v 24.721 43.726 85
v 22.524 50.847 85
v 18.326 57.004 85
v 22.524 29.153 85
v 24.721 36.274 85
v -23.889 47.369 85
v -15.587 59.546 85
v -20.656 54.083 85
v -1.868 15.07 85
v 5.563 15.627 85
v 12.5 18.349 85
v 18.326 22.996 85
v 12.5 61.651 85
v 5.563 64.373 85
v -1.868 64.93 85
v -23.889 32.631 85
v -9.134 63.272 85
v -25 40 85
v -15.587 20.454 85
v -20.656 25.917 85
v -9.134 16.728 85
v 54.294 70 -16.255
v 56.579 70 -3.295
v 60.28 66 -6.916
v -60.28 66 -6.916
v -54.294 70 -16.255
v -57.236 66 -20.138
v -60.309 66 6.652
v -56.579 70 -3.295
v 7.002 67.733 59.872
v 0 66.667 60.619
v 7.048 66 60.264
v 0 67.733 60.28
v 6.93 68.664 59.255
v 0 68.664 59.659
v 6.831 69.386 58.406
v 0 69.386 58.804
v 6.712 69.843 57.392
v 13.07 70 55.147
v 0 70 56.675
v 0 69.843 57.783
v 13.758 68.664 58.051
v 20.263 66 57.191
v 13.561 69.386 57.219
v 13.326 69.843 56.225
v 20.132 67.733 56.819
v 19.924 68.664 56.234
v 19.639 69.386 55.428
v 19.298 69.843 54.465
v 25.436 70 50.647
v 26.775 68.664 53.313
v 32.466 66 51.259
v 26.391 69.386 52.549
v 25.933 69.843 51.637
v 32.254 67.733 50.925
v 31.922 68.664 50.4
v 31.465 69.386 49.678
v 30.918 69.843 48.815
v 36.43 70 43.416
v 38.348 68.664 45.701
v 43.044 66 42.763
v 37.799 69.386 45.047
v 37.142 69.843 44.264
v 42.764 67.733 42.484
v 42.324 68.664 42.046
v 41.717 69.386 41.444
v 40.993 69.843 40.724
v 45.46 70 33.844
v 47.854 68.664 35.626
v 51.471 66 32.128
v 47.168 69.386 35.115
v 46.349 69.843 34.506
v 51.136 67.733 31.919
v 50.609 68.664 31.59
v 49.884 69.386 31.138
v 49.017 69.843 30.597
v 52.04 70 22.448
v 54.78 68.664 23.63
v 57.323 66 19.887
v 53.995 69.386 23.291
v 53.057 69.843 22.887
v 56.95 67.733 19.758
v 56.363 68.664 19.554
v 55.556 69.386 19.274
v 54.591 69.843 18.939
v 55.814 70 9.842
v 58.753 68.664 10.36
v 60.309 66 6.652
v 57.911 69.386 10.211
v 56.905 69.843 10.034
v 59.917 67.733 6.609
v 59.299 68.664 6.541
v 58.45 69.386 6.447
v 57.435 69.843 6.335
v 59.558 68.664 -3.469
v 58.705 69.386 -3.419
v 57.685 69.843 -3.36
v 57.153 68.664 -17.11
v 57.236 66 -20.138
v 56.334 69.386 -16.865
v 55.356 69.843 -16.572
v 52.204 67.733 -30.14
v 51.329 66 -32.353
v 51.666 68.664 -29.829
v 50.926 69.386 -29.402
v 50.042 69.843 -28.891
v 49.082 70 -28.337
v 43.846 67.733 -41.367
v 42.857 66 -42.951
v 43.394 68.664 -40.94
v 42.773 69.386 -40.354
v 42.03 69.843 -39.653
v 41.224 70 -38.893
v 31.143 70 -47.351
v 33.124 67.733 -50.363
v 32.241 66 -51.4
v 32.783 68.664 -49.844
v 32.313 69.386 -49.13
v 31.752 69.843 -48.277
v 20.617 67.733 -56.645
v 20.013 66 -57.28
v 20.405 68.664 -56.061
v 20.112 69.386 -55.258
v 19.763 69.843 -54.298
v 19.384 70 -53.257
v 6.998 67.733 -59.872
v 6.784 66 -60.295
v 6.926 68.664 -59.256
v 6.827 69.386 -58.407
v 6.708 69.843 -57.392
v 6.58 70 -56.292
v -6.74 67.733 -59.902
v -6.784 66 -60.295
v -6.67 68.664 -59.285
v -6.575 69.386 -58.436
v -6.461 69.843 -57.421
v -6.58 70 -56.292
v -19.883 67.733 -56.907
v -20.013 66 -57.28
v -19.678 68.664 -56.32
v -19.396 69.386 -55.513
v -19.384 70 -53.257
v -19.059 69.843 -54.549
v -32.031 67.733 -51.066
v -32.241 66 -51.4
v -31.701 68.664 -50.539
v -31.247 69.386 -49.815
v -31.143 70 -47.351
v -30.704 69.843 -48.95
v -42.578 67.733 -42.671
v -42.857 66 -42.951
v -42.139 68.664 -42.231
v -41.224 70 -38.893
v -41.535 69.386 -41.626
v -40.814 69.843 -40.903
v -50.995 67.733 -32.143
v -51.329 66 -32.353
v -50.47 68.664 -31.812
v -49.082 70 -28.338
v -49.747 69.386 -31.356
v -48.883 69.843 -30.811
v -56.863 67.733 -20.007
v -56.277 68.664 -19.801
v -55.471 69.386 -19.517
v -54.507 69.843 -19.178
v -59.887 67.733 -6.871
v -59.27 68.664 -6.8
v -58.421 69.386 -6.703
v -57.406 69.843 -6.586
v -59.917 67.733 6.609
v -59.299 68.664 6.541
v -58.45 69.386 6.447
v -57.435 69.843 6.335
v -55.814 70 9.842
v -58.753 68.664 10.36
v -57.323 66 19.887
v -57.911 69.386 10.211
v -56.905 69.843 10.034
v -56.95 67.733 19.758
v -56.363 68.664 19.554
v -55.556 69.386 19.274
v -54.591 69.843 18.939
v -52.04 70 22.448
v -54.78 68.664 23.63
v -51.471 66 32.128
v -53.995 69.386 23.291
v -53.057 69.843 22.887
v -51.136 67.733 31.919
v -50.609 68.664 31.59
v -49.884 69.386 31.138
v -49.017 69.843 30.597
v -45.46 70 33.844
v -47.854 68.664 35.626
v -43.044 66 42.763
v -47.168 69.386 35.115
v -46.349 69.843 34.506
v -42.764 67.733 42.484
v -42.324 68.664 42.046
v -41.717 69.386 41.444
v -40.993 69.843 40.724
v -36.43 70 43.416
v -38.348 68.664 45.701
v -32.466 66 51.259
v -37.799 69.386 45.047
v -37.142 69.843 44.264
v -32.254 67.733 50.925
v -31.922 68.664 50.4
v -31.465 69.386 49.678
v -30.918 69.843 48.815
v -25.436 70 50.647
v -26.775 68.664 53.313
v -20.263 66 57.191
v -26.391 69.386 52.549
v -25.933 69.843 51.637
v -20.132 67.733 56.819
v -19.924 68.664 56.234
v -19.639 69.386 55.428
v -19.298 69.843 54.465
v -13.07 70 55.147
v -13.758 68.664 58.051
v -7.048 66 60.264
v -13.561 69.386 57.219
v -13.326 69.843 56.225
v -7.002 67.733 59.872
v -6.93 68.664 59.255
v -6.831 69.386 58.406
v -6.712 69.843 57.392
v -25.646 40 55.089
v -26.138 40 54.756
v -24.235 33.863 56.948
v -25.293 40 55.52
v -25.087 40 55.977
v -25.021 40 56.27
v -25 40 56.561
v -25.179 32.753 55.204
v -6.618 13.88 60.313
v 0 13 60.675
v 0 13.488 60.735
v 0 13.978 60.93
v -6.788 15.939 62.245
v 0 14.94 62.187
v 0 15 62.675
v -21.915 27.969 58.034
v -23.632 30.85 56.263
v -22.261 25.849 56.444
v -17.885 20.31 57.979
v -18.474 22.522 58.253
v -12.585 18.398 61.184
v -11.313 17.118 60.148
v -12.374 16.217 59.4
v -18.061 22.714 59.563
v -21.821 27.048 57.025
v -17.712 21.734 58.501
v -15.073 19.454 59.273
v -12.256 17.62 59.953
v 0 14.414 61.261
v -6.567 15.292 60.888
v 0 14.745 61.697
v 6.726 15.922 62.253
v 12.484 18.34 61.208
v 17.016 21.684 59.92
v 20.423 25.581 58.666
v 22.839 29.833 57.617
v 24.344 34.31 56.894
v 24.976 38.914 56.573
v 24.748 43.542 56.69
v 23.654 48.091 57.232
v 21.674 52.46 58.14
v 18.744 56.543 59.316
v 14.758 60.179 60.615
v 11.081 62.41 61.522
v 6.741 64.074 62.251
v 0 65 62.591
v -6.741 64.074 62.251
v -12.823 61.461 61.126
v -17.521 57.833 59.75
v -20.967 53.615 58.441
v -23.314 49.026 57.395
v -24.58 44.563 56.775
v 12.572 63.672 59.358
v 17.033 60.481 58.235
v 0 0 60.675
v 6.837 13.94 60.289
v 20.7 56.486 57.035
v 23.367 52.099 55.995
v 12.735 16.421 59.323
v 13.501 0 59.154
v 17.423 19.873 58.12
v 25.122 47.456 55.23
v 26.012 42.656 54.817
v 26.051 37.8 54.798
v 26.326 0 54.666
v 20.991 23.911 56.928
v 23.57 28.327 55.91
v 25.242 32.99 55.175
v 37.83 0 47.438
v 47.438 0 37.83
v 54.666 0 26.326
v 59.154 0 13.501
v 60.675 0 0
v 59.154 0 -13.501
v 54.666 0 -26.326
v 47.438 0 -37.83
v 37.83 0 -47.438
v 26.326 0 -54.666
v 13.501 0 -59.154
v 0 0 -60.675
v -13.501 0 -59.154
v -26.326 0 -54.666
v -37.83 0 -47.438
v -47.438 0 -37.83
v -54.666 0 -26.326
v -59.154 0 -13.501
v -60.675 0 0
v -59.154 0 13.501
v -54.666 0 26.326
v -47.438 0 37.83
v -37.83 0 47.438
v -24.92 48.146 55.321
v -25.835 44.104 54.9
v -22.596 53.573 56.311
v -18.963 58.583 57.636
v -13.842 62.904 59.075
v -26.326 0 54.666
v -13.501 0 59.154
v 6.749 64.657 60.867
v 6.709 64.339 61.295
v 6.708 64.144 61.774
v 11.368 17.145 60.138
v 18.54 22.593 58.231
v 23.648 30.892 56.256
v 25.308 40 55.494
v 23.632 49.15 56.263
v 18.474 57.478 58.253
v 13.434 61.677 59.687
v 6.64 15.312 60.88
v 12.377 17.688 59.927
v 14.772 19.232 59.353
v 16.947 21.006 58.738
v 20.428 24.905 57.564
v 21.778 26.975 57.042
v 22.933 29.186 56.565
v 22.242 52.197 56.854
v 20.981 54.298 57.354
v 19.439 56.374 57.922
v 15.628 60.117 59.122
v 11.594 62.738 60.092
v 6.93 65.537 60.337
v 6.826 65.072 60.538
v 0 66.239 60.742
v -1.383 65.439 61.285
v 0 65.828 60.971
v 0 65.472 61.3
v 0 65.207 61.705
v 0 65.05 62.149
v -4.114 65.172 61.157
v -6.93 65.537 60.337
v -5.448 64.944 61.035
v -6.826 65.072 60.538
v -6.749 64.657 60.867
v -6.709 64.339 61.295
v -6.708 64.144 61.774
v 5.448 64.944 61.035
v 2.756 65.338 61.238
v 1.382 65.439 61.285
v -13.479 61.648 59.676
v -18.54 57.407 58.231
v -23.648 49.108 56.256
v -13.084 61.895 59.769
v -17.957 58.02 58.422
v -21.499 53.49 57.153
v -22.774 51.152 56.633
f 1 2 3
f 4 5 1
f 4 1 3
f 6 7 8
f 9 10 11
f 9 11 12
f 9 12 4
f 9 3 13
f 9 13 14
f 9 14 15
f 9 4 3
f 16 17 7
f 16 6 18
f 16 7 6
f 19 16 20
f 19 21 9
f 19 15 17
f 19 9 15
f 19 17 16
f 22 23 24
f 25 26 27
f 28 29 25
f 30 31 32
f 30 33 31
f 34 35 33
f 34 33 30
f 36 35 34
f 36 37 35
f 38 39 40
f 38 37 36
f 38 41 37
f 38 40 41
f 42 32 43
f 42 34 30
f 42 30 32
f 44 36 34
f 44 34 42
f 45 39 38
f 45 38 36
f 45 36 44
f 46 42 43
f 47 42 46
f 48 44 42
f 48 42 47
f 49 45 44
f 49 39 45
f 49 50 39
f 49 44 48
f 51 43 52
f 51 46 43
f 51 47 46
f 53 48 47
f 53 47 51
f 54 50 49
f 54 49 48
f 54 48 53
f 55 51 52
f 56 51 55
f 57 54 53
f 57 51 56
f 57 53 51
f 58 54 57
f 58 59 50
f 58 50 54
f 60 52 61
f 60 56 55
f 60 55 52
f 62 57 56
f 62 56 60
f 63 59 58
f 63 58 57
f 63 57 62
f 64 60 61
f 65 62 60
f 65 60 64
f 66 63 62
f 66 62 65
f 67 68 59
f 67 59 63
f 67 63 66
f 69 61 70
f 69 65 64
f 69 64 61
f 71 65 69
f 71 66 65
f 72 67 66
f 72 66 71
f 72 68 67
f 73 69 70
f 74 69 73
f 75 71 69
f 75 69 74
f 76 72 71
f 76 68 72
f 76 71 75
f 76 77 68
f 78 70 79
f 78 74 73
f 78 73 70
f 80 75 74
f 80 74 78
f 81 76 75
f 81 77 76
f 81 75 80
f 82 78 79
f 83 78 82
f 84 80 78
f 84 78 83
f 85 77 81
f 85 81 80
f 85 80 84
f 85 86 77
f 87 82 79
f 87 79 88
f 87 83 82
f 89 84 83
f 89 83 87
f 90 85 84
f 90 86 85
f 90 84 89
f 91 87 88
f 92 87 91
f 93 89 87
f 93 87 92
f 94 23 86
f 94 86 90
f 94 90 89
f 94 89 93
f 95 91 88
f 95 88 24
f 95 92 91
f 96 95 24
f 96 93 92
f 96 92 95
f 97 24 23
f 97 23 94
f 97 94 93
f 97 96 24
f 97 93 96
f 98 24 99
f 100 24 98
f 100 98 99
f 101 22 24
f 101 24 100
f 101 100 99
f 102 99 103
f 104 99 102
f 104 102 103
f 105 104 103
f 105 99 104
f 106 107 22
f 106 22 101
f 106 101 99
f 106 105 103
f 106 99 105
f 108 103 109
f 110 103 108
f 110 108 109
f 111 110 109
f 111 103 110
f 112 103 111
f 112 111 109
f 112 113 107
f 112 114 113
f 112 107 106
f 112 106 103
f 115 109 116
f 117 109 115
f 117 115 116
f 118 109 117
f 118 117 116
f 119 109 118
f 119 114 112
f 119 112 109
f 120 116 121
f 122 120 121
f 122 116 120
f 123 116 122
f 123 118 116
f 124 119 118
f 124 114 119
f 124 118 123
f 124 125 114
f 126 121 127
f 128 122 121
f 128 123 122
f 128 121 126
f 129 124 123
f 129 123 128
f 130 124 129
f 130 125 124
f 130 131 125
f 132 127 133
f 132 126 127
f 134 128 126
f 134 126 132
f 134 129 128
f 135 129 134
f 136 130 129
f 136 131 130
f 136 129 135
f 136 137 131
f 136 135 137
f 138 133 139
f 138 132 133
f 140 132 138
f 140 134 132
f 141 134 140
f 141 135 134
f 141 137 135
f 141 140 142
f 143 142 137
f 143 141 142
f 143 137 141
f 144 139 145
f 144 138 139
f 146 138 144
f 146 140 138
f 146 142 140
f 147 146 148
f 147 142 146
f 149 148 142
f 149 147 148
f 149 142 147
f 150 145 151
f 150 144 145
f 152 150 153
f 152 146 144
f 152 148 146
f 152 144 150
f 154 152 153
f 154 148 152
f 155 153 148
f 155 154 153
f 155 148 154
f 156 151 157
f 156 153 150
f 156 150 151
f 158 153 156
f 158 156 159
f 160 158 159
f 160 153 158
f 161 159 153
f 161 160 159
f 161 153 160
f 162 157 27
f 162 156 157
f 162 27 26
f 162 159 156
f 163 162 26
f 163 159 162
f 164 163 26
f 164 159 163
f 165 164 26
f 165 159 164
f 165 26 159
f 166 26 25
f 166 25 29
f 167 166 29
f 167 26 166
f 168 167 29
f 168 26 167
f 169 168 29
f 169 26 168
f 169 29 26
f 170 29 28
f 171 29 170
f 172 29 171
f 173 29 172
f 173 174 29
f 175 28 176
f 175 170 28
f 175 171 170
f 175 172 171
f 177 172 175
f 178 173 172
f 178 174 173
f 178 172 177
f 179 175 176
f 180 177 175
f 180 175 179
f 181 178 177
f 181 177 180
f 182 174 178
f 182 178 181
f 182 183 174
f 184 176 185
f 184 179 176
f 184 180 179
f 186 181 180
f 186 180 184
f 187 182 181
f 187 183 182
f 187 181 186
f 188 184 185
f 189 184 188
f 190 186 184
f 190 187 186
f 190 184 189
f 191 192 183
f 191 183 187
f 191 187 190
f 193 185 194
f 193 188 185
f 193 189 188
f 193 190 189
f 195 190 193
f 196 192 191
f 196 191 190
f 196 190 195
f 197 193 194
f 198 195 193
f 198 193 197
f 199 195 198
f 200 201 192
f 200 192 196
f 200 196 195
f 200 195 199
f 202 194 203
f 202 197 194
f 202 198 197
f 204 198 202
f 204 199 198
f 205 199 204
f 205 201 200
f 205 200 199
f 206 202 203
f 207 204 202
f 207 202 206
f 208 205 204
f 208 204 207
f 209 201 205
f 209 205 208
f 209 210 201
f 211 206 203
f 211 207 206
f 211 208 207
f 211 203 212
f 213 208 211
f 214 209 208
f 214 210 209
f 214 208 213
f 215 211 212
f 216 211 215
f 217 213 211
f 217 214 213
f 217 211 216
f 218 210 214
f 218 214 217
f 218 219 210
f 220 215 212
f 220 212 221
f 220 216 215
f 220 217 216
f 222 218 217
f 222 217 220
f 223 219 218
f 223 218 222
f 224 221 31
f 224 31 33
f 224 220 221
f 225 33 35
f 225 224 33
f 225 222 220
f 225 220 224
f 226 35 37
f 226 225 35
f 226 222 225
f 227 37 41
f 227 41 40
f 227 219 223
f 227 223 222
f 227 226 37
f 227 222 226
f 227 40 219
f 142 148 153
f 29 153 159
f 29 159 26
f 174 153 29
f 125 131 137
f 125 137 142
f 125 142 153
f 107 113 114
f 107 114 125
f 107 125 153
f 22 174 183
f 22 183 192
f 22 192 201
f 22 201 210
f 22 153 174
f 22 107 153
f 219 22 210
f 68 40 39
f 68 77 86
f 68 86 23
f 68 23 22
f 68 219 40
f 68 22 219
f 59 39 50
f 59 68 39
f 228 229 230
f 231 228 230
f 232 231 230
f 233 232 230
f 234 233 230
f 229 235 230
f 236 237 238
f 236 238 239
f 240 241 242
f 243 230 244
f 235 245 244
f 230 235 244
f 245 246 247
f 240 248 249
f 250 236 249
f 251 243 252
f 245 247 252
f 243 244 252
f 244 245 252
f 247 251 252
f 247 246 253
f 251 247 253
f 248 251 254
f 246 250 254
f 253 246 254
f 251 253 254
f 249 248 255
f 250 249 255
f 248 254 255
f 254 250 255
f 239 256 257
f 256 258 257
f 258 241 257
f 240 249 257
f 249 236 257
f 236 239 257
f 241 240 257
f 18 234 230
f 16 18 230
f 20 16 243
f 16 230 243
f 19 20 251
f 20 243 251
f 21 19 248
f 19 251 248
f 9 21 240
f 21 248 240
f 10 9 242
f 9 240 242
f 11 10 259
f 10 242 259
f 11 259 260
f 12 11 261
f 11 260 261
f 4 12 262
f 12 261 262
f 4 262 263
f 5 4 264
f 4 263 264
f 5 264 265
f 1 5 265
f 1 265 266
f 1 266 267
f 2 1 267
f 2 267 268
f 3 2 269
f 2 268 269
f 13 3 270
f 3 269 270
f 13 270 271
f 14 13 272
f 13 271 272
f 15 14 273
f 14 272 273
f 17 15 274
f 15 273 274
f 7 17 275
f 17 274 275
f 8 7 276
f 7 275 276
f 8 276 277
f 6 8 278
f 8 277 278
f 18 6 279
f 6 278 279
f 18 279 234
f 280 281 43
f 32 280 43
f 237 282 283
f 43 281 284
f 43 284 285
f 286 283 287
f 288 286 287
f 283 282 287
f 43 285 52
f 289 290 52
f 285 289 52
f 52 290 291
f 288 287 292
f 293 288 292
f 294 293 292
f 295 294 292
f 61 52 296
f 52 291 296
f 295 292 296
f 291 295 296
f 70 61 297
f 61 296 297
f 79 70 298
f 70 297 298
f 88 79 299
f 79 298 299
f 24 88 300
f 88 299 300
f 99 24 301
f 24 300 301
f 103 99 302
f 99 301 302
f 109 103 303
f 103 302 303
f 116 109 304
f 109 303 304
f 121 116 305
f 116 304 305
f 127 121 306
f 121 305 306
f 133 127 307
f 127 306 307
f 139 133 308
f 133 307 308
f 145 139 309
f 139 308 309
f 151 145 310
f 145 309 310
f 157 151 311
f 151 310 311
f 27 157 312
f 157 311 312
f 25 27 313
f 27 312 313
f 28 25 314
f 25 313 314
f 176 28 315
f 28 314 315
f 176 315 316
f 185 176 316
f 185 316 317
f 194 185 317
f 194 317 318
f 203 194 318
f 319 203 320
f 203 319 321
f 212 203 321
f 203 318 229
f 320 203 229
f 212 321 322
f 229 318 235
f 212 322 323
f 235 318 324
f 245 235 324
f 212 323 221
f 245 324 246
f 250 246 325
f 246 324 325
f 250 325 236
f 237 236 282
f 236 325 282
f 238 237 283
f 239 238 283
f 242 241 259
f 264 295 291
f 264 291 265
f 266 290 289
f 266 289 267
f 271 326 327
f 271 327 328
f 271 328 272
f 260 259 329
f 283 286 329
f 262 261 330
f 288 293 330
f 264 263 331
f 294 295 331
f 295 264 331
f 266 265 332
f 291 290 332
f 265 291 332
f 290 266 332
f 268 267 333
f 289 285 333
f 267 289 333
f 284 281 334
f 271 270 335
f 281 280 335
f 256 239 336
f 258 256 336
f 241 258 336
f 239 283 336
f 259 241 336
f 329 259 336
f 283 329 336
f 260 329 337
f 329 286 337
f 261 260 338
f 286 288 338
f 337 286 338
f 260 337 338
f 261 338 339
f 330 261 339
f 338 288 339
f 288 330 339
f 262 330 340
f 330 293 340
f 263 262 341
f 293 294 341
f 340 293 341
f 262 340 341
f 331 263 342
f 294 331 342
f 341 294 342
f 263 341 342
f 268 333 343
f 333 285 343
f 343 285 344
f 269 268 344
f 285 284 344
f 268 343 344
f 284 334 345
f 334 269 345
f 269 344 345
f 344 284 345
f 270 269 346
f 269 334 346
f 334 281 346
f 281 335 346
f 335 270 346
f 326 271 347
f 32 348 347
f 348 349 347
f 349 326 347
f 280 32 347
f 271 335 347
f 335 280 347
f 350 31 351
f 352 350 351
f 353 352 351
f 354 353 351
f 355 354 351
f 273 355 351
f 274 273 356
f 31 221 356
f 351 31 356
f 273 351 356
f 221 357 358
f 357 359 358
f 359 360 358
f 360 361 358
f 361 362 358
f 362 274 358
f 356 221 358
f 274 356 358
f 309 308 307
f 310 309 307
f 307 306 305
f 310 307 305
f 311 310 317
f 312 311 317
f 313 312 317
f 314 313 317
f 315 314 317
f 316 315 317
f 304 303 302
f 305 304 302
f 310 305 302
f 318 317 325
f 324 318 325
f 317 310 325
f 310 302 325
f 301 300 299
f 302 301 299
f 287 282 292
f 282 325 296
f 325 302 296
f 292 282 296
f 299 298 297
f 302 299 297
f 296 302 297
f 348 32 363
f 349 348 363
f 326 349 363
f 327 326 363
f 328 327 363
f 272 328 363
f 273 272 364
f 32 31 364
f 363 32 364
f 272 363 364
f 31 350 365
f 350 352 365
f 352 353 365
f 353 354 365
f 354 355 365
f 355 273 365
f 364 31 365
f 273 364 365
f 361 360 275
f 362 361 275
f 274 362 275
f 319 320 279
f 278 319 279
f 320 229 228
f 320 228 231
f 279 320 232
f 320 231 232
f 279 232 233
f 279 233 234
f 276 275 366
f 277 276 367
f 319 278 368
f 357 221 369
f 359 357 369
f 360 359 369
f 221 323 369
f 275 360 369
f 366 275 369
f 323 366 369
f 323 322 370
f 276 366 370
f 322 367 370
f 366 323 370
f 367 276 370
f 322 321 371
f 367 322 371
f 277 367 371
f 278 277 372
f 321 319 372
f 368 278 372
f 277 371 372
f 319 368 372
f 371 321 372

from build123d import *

# Parameters (mm, degrees)
SKETCH1_R           = 60.675
BOSS_EXTRUDE1_DEPTH = 70
SKETCH2_R           = 25
BOSS_EXTRUDE2_DEPTH = 85
FILLET1_R           = 4
FILLET2_R           = 2


with BuildPart() as part:
    # Sketch1 → Boss-Extrude1 (new body)
    with BuildSketch(Plane(origin=(0, 0, 0), x_dir=(1, 0, 0), z_dir=(0, 1, 0))):
        with Locations(Location((0, 0, 0), (0, 0, 270))):
            Circle(SKETCH1_R)
    extrude(amount=BOSS_EXTRUDE1_DEPTH)

    # Sketch2 → Boss-Extrude2 (add)
    with BuildSketch(Plane.XY):
        with Locations(Location((0, 40, 0), (0, 0, 180))):
            Circle(SKETCH2_R)
    extrude(amount=BOSS_EXTRUDE2_DEPTH)

    # Fillet1
    fillet1_edges = [part.edges().sort_by_distance(p)[0] for p in [
        (0, 70, -60.675),
    ]]
    fillet(fillet1_edges, radius=FILLET1_R)

    # Fillet2
    fillet2_edges = [part.edges().sort_by_distance(p)[0] for p in [
        (25, 40, 55.285220674),
    ]]
    fillet(fillet2_edges, radius=FILLET2_R)


solid = part.part
